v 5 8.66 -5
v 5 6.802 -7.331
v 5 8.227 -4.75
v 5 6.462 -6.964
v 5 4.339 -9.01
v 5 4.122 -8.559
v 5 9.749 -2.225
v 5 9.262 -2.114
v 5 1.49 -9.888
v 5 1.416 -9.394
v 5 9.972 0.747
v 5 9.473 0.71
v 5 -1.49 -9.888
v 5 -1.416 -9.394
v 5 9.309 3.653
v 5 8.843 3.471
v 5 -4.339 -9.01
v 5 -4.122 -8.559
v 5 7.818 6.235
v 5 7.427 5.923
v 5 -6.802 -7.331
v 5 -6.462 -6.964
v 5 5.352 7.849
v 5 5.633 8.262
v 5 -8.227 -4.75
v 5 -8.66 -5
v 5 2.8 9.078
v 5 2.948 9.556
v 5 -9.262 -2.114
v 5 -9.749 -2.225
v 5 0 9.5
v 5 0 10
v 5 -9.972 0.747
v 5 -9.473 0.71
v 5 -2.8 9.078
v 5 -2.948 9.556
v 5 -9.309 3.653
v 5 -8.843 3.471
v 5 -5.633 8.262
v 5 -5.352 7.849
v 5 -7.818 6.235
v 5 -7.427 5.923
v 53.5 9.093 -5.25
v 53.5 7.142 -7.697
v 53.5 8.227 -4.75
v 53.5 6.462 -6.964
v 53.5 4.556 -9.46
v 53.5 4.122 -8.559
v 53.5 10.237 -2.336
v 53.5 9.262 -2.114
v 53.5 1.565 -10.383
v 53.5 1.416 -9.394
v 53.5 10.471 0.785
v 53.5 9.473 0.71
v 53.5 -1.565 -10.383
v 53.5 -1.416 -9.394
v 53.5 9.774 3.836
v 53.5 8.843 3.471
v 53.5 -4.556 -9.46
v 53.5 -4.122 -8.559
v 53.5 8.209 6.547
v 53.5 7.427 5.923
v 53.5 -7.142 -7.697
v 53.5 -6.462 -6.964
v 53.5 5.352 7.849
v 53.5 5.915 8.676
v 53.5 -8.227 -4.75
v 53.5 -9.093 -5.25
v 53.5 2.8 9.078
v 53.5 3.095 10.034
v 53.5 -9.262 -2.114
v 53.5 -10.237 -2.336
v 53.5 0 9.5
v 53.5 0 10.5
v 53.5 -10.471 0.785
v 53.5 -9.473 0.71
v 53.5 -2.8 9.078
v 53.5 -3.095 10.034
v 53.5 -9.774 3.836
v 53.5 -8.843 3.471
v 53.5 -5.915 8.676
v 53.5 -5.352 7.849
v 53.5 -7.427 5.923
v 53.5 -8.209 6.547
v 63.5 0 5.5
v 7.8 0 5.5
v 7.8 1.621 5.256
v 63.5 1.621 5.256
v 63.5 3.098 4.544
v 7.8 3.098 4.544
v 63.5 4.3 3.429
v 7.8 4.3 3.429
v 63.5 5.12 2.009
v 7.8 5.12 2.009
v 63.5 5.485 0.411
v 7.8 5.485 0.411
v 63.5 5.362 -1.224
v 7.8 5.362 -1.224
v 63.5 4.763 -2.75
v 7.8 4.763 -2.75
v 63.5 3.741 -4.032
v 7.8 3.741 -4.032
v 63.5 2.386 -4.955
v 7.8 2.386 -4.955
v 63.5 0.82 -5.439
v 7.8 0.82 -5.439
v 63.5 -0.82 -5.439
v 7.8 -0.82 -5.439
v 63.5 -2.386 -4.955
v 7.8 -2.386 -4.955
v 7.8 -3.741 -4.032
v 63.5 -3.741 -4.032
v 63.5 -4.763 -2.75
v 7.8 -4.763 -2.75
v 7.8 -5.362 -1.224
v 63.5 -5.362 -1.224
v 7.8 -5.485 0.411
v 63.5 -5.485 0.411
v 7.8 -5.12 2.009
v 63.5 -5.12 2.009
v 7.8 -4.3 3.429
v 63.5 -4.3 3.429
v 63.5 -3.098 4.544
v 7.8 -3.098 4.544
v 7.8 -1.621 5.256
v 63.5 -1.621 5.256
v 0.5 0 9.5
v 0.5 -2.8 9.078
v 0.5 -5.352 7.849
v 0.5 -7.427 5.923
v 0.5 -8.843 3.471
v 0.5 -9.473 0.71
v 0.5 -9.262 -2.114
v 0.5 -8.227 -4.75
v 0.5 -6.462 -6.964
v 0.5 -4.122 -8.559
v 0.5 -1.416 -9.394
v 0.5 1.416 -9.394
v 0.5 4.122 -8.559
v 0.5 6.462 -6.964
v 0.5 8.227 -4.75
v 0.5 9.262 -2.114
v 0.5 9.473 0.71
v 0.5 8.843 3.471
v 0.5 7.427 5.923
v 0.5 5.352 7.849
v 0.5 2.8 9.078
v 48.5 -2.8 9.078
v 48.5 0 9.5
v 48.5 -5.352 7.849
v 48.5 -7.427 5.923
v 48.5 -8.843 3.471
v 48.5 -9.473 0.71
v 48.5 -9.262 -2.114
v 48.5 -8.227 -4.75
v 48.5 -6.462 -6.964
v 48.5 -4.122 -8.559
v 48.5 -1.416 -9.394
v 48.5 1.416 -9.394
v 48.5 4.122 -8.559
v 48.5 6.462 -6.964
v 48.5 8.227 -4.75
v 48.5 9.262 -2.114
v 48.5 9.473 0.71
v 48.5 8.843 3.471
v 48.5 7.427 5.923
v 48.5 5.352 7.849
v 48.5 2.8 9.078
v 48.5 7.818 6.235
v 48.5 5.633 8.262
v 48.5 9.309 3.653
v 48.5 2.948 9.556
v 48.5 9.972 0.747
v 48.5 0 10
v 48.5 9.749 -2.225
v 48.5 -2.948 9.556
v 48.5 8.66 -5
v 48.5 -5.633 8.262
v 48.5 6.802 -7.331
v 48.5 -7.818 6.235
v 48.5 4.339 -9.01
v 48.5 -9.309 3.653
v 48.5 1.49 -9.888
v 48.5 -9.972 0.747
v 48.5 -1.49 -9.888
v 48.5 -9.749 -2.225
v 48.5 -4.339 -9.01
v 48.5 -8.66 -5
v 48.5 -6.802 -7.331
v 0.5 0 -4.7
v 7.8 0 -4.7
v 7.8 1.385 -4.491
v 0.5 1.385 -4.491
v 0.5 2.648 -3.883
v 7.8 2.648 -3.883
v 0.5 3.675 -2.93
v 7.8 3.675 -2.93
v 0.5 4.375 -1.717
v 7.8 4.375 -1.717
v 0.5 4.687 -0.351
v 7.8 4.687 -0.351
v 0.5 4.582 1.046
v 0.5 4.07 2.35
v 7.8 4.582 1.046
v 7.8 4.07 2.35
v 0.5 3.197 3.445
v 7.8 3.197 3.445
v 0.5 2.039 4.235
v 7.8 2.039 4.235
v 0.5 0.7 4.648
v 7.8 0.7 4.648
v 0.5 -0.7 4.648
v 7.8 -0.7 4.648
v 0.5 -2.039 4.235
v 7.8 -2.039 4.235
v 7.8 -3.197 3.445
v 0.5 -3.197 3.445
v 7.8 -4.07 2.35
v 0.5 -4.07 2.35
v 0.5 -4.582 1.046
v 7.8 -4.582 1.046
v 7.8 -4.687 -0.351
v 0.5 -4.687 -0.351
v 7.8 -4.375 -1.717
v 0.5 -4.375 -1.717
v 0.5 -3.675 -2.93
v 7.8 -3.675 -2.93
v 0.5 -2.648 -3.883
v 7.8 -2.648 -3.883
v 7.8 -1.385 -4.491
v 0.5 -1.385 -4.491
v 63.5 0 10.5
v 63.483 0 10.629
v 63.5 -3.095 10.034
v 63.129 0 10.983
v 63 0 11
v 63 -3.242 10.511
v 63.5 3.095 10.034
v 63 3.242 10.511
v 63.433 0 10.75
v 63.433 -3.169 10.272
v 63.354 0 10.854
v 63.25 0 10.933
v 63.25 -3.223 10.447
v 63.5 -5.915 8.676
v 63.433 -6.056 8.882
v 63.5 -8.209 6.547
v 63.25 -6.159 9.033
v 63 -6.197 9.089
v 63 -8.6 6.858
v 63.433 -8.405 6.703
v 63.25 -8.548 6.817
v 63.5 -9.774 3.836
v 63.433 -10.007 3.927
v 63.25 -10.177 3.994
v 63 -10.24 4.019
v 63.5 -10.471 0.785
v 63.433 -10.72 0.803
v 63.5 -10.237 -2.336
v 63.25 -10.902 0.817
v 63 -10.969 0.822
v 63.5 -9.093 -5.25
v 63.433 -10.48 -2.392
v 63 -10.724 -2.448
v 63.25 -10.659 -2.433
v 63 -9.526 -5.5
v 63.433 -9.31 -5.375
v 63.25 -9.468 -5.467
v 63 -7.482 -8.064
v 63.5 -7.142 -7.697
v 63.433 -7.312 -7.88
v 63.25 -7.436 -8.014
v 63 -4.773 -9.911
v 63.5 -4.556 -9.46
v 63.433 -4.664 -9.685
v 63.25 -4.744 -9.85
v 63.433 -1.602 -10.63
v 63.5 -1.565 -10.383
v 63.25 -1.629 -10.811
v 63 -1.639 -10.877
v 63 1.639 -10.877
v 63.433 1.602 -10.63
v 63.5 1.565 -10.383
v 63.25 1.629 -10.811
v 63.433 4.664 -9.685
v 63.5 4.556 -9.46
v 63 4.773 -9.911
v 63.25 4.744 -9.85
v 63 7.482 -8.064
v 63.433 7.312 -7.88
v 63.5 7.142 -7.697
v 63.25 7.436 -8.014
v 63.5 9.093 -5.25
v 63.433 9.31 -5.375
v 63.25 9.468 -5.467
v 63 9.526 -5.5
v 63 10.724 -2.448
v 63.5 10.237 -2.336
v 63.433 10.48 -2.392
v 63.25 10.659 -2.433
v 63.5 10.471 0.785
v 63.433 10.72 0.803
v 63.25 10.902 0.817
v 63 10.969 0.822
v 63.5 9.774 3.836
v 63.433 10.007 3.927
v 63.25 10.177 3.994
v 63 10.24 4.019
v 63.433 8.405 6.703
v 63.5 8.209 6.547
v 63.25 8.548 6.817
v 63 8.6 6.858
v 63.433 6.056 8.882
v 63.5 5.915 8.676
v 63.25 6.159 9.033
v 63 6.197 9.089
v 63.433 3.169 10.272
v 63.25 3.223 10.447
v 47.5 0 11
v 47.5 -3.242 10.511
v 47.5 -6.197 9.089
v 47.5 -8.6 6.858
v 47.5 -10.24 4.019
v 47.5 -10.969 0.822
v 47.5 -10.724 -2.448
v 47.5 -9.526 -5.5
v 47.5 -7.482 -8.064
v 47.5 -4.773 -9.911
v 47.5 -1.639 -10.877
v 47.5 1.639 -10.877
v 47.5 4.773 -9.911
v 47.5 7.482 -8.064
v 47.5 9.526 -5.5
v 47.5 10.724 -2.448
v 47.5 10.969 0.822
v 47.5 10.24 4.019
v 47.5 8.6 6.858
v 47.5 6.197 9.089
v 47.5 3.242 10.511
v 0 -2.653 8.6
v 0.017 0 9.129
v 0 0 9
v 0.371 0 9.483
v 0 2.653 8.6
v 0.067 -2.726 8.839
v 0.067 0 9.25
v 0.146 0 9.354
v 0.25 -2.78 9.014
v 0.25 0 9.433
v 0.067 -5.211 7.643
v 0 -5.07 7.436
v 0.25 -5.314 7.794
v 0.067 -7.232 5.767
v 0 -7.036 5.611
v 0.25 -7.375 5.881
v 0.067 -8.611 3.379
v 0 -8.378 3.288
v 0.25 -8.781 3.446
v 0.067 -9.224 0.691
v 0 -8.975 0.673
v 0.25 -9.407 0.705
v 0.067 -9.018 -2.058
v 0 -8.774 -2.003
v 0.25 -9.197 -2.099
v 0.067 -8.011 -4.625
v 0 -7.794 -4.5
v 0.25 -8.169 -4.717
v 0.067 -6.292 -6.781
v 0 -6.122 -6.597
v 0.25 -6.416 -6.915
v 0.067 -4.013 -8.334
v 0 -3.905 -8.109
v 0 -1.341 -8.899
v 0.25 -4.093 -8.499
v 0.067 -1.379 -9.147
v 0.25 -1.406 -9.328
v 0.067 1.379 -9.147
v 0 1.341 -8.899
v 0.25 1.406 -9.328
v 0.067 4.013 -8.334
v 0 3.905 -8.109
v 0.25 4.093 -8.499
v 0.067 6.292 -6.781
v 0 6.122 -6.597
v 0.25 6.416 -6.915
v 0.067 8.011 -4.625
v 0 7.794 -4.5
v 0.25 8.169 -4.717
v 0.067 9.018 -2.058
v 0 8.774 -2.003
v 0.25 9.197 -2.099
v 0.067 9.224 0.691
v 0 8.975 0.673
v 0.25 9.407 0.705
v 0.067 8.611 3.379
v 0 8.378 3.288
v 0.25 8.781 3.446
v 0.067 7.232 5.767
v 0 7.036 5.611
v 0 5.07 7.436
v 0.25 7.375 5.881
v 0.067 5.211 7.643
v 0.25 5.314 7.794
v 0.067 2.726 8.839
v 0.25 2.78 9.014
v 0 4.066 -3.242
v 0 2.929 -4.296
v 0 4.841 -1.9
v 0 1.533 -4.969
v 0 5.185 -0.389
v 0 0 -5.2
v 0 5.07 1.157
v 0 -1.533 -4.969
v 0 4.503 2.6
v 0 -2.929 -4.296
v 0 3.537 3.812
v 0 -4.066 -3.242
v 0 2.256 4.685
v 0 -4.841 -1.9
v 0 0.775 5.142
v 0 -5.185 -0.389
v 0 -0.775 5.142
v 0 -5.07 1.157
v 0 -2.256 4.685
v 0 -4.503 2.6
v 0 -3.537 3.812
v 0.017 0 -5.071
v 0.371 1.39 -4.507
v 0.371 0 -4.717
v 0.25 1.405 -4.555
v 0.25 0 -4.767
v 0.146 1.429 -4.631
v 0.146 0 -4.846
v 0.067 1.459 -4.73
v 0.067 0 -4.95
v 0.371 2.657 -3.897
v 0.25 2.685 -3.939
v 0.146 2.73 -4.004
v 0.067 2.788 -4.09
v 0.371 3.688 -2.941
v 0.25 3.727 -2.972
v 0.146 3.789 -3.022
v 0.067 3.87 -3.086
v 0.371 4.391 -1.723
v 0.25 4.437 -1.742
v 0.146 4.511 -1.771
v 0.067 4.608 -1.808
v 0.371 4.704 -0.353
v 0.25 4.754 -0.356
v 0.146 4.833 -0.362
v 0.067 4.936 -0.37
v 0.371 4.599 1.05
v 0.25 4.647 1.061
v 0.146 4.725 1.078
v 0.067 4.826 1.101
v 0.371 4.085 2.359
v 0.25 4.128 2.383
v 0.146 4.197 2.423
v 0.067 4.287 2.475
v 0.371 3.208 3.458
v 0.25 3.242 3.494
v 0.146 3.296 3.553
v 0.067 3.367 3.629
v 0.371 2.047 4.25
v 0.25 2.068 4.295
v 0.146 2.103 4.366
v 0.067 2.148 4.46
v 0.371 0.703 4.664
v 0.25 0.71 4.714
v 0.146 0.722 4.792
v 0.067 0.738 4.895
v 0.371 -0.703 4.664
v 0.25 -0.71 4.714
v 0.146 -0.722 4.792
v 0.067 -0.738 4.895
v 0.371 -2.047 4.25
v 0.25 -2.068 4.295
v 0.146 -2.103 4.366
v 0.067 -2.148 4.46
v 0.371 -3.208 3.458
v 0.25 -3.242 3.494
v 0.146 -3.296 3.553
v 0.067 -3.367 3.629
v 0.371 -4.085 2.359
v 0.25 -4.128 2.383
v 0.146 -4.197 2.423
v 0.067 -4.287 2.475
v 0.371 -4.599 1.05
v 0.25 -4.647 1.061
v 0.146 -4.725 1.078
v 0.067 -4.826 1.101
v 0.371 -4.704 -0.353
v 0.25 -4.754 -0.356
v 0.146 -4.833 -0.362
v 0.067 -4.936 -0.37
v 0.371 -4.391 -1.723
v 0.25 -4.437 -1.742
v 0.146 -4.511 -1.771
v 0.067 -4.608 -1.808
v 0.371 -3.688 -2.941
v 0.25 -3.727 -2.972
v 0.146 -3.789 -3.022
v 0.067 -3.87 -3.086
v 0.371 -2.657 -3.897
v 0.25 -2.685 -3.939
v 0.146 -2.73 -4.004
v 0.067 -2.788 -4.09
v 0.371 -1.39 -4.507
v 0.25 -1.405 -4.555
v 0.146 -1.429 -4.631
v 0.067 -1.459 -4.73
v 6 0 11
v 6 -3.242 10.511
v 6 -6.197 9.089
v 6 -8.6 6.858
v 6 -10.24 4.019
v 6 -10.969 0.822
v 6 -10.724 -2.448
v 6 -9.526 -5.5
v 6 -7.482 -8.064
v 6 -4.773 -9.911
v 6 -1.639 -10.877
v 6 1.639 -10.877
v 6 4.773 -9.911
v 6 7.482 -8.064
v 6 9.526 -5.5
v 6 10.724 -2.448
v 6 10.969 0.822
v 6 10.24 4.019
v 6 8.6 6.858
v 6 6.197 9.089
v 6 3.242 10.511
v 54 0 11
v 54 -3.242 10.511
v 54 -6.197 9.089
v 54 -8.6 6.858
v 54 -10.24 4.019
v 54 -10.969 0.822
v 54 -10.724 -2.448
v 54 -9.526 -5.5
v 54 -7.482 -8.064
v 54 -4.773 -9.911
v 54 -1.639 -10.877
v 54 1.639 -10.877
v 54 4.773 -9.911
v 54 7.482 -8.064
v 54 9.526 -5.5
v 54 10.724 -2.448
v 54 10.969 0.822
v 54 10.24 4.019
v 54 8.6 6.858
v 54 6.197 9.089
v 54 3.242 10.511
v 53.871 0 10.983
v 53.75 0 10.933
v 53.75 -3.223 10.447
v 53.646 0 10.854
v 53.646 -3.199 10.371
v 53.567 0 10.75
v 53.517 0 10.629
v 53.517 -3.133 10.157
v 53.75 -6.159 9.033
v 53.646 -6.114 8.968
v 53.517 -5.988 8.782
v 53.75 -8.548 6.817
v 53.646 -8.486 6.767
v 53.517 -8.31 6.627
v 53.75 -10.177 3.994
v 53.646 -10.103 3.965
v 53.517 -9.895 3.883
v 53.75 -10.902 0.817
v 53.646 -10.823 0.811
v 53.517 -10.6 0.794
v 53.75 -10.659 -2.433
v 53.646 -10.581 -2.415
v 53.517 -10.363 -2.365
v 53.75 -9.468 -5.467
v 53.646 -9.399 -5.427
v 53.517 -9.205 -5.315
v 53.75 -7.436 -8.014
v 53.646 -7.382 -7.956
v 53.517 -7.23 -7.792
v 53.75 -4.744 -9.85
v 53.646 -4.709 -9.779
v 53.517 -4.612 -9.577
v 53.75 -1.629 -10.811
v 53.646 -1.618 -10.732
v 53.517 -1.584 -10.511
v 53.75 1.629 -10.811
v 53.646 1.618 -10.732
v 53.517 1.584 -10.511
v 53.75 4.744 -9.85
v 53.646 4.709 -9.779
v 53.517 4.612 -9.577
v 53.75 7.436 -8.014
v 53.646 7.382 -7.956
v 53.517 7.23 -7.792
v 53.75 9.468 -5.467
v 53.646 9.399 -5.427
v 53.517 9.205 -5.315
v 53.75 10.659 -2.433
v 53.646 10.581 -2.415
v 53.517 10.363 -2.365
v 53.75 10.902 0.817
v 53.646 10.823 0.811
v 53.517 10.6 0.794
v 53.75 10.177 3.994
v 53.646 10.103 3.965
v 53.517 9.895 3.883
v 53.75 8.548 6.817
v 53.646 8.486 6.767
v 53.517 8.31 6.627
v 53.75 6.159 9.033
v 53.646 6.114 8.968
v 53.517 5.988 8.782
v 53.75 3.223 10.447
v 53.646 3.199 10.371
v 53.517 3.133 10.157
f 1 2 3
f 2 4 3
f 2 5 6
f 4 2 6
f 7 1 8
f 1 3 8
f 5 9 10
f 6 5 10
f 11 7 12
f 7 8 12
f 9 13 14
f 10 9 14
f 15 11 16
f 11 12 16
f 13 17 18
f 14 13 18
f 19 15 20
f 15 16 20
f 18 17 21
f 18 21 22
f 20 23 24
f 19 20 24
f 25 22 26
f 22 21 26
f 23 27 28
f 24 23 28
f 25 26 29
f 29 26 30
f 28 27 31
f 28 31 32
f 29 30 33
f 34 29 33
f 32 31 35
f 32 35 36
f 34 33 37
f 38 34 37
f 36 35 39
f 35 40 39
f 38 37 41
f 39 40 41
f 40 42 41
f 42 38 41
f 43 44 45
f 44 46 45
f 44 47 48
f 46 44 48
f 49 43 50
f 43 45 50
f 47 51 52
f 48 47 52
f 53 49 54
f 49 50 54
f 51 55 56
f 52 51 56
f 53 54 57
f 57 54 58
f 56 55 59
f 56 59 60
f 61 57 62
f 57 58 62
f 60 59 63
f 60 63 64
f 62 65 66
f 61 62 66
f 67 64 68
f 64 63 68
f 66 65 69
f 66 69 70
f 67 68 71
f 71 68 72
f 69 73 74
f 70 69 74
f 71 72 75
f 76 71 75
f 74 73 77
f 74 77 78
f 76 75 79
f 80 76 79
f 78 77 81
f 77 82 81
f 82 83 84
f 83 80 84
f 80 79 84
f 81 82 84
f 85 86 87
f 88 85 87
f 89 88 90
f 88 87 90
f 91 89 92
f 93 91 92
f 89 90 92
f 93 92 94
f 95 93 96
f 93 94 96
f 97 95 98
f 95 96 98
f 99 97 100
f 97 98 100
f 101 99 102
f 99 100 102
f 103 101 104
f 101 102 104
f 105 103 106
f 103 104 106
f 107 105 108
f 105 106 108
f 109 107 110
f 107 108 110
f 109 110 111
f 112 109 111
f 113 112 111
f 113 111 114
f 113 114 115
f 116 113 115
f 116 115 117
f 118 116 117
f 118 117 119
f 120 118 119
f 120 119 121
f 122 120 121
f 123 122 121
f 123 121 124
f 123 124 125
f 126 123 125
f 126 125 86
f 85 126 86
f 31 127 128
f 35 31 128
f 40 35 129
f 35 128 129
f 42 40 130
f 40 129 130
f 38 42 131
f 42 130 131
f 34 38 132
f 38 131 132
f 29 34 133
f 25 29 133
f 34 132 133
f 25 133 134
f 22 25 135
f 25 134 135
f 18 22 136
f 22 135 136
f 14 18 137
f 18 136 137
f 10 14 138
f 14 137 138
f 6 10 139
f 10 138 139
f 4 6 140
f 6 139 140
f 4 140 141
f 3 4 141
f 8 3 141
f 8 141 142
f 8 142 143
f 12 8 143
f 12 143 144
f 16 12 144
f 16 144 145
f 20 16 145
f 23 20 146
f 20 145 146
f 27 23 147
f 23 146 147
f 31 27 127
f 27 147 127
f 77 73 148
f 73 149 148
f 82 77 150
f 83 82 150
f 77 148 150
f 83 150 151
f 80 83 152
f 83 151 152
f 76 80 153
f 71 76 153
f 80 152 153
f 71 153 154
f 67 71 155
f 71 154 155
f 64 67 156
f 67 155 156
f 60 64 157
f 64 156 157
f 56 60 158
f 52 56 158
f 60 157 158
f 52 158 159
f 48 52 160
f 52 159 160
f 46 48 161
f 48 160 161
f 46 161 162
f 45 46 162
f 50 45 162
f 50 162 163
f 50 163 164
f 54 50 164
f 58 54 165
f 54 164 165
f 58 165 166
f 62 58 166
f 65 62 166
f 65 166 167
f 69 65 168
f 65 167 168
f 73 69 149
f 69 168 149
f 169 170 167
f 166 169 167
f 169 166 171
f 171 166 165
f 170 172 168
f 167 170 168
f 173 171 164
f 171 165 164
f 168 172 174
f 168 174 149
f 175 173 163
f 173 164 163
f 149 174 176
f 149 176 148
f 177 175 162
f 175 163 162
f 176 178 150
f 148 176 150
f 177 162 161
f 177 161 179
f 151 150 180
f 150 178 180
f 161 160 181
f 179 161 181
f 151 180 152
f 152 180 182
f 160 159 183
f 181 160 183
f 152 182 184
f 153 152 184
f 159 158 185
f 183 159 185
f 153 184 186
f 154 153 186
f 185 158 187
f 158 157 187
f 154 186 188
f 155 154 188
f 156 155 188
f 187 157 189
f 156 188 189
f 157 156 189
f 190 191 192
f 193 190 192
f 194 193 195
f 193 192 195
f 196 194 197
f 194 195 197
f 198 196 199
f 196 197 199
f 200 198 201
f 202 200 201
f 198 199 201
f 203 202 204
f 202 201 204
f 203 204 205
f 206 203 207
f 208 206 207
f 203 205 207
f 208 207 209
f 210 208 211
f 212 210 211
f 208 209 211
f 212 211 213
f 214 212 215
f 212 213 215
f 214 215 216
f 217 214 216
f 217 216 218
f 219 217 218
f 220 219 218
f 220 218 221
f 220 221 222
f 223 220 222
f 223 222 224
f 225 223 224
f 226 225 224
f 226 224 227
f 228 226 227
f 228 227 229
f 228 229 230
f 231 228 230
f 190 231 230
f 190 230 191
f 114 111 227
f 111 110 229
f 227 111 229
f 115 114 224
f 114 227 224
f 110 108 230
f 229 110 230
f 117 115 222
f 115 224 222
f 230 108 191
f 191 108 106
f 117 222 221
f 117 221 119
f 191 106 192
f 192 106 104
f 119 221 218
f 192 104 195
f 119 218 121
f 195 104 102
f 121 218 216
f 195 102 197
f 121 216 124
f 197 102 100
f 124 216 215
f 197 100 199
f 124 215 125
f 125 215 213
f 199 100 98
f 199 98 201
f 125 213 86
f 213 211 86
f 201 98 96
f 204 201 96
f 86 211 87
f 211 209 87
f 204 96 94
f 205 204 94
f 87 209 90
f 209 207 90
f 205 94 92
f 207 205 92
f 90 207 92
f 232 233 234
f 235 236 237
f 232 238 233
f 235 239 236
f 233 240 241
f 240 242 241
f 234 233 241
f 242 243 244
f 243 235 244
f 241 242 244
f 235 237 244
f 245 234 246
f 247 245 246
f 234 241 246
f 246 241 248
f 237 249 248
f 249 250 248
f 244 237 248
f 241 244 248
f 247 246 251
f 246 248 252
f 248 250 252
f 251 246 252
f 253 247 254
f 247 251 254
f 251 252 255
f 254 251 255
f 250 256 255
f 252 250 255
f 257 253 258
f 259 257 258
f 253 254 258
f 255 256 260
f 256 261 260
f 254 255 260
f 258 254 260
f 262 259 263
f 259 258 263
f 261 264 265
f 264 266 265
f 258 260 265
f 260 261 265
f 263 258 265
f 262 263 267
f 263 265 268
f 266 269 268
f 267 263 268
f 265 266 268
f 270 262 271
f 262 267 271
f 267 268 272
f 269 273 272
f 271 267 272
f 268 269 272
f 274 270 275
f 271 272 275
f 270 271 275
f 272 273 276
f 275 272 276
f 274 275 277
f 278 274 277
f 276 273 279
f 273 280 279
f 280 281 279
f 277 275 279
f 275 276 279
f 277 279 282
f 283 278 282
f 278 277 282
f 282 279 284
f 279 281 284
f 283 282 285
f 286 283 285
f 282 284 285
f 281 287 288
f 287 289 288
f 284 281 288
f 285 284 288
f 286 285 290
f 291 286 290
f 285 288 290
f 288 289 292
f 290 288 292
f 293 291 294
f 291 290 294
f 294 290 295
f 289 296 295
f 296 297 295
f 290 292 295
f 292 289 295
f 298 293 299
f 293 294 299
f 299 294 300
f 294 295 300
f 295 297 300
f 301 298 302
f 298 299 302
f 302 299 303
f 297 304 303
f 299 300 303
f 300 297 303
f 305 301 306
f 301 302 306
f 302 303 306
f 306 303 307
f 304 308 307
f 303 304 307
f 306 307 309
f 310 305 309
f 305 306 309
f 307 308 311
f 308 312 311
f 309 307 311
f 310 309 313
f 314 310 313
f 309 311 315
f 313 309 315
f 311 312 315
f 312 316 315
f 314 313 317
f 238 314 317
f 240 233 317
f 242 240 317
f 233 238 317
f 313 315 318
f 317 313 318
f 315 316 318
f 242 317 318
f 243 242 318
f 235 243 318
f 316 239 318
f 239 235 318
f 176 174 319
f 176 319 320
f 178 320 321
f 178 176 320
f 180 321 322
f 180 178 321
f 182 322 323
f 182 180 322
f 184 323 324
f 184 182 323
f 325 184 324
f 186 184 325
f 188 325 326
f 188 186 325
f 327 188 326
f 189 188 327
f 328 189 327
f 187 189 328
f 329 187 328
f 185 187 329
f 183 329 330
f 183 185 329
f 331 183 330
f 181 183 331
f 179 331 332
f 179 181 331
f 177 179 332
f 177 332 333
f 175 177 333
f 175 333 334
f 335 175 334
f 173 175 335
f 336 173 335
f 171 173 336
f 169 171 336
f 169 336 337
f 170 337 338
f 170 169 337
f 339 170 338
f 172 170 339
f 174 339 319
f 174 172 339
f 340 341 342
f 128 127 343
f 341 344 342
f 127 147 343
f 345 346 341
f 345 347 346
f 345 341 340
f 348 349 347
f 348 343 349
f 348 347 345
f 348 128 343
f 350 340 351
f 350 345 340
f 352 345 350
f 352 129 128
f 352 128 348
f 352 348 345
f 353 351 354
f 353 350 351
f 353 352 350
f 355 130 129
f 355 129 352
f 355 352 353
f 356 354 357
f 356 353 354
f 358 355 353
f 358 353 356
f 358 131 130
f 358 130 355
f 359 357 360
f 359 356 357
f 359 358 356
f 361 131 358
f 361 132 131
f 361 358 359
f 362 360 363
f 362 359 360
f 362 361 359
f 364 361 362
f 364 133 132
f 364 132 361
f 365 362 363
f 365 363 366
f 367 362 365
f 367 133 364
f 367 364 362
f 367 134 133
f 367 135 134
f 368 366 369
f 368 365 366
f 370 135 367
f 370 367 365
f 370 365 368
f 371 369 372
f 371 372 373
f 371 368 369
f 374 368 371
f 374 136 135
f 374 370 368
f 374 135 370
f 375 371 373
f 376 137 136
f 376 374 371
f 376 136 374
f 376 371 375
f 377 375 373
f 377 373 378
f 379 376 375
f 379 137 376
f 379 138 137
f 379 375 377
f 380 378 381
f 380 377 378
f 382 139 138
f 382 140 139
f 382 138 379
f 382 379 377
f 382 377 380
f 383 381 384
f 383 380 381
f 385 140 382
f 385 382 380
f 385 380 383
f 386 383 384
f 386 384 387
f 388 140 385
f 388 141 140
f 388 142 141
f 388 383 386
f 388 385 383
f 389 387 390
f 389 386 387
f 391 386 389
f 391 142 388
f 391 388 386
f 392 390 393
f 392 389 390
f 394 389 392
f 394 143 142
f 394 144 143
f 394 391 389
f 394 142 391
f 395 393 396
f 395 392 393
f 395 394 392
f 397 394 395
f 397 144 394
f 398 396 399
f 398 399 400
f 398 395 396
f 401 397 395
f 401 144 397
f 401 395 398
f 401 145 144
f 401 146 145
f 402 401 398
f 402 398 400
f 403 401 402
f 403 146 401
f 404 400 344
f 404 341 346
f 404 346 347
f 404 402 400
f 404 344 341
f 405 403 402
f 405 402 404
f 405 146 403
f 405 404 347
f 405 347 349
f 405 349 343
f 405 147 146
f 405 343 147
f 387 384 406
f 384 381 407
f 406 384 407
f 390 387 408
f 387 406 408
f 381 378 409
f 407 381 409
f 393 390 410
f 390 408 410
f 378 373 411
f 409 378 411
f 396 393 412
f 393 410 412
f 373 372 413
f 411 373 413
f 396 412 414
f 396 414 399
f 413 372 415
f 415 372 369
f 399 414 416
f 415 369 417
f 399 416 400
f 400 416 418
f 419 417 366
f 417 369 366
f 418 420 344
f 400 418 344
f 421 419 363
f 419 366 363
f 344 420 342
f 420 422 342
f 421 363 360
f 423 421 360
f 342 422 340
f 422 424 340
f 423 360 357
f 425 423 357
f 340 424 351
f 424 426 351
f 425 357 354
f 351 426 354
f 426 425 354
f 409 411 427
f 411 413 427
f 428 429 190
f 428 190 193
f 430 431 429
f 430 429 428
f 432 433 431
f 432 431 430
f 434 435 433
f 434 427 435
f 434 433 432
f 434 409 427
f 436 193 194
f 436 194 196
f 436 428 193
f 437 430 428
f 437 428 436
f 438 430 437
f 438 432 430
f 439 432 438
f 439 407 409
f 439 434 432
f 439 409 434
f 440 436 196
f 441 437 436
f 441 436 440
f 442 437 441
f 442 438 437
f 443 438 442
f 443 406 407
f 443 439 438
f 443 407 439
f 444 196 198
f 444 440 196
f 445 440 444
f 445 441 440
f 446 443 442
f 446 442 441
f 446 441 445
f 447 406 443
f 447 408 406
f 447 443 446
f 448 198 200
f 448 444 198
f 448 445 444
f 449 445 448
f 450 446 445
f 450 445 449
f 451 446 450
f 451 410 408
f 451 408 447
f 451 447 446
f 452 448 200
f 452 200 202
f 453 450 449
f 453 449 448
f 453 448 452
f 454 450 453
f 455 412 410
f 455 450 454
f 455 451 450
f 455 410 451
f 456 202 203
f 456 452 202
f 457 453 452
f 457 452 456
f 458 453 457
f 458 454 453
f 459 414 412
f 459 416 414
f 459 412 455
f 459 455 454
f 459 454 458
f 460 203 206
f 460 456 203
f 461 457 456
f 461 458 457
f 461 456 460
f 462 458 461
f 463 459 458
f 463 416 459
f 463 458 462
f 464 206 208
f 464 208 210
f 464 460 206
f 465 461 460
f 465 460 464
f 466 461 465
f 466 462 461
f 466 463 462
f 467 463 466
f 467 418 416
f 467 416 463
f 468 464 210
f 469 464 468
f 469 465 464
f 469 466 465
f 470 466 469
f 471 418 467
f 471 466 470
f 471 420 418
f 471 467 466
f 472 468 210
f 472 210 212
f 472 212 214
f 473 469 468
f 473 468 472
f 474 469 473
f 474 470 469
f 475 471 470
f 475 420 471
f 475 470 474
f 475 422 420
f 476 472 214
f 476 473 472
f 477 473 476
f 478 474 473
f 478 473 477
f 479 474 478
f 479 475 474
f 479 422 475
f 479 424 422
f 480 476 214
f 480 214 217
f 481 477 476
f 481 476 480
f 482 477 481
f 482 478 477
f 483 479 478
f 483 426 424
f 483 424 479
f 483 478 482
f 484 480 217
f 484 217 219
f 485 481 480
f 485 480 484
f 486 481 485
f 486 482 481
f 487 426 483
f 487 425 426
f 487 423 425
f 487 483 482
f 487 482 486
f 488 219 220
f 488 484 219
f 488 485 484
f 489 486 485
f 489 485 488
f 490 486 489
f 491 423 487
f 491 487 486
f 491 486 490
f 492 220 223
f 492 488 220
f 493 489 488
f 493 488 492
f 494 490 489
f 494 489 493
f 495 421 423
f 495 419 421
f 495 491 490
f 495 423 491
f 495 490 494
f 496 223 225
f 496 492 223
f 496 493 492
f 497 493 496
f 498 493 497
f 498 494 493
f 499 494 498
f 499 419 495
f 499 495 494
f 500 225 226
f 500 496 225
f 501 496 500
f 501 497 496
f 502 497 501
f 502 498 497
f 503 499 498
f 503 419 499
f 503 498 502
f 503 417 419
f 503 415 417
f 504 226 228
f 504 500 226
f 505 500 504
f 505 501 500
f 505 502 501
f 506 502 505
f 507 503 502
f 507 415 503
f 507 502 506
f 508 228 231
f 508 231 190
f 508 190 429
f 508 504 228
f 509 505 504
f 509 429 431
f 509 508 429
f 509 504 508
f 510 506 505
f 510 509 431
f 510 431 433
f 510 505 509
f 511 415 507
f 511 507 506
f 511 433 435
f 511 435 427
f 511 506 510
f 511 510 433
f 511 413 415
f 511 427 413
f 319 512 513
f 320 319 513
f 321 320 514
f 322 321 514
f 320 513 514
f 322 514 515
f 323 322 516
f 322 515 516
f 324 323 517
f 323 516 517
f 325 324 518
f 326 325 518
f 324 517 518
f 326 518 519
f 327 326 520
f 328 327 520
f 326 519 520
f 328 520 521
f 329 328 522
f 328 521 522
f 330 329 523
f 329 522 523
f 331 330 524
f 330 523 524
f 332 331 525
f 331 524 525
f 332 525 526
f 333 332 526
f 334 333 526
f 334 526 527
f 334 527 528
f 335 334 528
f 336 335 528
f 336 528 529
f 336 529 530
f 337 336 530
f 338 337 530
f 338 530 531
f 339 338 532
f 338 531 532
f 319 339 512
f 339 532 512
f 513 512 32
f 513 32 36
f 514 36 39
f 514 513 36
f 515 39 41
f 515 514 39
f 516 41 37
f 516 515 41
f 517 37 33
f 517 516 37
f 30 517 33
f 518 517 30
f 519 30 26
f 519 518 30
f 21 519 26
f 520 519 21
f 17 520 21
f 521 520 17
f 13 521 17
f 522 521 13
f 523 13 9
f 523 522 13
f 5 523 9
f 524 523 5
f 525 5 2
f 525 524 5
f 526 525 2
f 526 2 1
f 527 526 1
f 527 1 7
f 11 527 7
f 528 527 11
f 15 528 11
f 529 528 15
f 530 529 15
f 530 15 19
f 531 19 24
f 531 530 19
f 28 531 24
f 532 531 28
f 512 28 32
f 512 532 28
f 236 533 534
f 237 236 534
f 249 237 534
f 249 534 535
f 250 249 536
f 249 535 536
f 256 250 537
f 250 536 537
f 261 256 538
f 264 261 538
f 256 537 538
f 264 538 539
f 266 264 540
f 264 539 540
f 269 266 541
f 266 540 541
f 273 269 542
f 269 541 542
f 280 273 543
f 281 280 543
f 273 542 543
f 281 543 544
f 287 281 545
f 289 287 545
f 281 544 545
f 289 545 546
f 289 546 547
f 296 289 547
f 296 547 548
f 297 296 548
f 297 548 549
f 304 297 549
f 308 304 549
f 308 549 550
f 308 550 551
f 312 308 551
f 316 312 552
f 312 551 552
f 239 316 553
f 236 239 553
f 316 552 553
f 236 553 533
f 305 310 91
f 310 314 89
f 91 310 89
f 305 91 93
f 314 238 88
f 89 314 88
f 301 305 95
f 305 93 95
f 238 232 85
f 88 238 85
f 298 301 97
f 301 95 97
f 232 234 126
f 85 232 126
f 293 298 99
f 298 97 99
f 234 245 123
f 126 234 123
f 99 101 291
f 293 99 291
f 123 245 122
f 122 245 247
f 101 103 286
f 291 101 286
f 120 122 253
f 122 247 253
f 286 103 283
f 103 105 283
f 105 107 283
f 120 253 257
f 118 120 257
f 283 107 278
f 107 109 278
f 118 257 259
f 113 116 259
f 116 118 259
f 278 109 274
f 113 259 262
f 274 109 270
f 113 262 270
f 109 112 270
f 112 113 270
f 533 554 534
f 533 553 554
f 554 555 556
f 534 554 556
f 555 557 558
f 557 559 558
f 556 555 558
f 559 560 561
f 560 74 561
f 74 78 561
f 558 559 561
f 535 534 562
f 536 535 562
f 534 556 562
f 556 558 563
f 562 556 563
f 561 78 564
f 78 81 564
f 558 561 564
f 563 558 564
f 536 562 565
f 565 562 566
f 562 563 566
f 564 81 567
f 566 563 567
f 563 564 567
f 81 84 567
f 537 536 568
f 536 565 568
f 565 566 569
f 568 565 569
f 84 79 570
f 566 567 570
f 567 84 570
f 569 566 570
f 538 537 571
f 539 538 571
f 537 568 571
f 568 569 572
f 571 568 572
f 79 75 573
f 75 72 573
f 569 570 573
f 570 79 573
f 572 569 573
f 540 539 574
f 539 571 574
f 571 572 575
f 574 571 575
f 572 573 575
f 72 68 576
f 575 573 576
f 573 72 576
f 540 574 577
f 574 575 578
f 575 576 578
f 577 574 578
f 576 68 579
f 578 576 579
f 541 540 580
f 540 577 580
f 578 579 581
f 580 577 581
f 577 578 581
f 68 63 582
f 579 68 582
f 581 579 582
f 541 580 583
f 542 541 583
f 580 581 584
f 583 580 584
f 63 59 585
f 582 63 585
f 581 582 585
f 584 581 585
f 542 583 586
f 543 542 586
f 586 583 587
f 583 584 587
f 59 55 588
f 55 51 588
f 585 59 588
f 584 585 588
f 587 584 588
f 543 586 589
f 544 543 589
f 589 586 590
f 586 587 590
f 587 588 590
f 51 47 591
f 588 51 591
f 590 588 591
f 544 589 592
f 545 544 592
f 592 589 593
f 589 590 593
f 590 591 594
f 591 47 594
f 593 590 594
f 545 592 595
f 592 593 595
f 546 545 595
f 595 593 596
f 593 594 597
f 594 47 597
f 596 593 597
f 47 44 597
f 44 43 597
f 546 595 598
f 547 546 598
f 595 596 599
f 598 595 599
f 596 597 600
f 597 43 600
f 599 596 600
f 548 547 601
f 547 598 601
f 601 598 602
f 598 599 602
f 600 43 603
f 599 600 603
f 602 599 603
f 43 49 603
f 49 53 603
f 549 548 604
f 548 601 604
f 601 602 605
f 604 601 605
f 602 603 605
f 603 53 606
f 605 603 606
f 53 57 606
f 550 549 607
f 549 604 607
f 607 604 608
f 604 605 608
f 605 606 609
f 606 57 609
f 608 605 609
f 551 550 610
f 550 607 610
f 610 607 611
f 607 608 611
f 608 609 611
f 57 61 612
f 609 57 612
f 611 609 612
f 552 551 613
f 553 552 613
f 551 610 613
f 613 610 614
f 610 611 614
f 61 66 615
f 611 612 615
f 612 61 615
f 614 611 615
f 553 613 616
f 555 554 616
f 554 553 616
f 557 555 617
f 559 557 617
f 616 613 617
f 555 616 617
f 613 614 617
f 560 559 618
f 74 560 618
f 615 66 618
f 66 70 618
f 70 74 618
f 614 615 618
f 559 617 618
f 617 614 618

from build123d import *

# Parameters (mm, degrees)
FURO1_D       = 11
FURO1_DEPTH   = 55.7
FURO2_D       = 9.4
FURO2_DEPTH   = 8
FILETE2_R     = 0.5
FILETE3_R     = 0.5
FILETE4_R     = 0.5
CHANFRO1_SIZE = 1


with BuildPart() as part:
    # Esboço1 → Revolução1 (revolve)
    with BuildSketch(Plane.XY, mode=Mode.PRIVATE) as revolu_o1_sk:
        Polygon((0, 0), (63.5, 0), (63.5, 11), (53.5, 11), (53.5, 9.5), (48.5, 9.5), (48.5, 11), (5, 11), (5, 9.5), (0, 9.5), align=None)
    revolve(revolu_o1_sk.sketch.rotate(Axis((0, 0, 0), (1, 0, 0)), 90), axis=Axis((0, 0, 0), (1, 0, 0)))

    # Furo1
    with Locations(Plane(origin=(63.5, 0, 0), x_dir=(0, 0, -1), z_dir=(1, 0, 0))):
        with Locations((0, 0)):
            Hole(FURO1_D / 2, depth=FURO1_DEPTH)

    # Furo2
    with Locations(Plane.ZY):
        with Locations((0, 0)):
            Hole(FURO2_D / 2, depth=FURO2_DEPTH)

    # Filete2
    filete2_edges = [part.edges().sort_by_distance(p)[0] for p in [
        (63.5, 0, -11),
        (53.5, 0, -11),
    ]]
    fillet(filete2_edges, radius=FILETE2_R)

    # Filete3
    filete3_edges = [part.edges().sort_by_distance(p)[0] for p in [
        (0, 0, 4.7),
    ]]
    fillet(filete3_edges, radius=FILETE3_R)

    # Filete4
    filete4_edges = [part.edges().sort_by_distance(p)[0] for p in [
        (0, 0, -9.5),
    ]]
    fillet(filete4_edges, radius=FILETE4_R)

    # Chanfro1
    chanfro1_edges = [part.edges().sort_by_distance(p)[0] for p in [
        (5, 0, -11),
        (48.5, 0, -11),
    ]]
    chamfer(chanfro1_edges, length=CHANFRO1_SIZE)


solid = part.part
